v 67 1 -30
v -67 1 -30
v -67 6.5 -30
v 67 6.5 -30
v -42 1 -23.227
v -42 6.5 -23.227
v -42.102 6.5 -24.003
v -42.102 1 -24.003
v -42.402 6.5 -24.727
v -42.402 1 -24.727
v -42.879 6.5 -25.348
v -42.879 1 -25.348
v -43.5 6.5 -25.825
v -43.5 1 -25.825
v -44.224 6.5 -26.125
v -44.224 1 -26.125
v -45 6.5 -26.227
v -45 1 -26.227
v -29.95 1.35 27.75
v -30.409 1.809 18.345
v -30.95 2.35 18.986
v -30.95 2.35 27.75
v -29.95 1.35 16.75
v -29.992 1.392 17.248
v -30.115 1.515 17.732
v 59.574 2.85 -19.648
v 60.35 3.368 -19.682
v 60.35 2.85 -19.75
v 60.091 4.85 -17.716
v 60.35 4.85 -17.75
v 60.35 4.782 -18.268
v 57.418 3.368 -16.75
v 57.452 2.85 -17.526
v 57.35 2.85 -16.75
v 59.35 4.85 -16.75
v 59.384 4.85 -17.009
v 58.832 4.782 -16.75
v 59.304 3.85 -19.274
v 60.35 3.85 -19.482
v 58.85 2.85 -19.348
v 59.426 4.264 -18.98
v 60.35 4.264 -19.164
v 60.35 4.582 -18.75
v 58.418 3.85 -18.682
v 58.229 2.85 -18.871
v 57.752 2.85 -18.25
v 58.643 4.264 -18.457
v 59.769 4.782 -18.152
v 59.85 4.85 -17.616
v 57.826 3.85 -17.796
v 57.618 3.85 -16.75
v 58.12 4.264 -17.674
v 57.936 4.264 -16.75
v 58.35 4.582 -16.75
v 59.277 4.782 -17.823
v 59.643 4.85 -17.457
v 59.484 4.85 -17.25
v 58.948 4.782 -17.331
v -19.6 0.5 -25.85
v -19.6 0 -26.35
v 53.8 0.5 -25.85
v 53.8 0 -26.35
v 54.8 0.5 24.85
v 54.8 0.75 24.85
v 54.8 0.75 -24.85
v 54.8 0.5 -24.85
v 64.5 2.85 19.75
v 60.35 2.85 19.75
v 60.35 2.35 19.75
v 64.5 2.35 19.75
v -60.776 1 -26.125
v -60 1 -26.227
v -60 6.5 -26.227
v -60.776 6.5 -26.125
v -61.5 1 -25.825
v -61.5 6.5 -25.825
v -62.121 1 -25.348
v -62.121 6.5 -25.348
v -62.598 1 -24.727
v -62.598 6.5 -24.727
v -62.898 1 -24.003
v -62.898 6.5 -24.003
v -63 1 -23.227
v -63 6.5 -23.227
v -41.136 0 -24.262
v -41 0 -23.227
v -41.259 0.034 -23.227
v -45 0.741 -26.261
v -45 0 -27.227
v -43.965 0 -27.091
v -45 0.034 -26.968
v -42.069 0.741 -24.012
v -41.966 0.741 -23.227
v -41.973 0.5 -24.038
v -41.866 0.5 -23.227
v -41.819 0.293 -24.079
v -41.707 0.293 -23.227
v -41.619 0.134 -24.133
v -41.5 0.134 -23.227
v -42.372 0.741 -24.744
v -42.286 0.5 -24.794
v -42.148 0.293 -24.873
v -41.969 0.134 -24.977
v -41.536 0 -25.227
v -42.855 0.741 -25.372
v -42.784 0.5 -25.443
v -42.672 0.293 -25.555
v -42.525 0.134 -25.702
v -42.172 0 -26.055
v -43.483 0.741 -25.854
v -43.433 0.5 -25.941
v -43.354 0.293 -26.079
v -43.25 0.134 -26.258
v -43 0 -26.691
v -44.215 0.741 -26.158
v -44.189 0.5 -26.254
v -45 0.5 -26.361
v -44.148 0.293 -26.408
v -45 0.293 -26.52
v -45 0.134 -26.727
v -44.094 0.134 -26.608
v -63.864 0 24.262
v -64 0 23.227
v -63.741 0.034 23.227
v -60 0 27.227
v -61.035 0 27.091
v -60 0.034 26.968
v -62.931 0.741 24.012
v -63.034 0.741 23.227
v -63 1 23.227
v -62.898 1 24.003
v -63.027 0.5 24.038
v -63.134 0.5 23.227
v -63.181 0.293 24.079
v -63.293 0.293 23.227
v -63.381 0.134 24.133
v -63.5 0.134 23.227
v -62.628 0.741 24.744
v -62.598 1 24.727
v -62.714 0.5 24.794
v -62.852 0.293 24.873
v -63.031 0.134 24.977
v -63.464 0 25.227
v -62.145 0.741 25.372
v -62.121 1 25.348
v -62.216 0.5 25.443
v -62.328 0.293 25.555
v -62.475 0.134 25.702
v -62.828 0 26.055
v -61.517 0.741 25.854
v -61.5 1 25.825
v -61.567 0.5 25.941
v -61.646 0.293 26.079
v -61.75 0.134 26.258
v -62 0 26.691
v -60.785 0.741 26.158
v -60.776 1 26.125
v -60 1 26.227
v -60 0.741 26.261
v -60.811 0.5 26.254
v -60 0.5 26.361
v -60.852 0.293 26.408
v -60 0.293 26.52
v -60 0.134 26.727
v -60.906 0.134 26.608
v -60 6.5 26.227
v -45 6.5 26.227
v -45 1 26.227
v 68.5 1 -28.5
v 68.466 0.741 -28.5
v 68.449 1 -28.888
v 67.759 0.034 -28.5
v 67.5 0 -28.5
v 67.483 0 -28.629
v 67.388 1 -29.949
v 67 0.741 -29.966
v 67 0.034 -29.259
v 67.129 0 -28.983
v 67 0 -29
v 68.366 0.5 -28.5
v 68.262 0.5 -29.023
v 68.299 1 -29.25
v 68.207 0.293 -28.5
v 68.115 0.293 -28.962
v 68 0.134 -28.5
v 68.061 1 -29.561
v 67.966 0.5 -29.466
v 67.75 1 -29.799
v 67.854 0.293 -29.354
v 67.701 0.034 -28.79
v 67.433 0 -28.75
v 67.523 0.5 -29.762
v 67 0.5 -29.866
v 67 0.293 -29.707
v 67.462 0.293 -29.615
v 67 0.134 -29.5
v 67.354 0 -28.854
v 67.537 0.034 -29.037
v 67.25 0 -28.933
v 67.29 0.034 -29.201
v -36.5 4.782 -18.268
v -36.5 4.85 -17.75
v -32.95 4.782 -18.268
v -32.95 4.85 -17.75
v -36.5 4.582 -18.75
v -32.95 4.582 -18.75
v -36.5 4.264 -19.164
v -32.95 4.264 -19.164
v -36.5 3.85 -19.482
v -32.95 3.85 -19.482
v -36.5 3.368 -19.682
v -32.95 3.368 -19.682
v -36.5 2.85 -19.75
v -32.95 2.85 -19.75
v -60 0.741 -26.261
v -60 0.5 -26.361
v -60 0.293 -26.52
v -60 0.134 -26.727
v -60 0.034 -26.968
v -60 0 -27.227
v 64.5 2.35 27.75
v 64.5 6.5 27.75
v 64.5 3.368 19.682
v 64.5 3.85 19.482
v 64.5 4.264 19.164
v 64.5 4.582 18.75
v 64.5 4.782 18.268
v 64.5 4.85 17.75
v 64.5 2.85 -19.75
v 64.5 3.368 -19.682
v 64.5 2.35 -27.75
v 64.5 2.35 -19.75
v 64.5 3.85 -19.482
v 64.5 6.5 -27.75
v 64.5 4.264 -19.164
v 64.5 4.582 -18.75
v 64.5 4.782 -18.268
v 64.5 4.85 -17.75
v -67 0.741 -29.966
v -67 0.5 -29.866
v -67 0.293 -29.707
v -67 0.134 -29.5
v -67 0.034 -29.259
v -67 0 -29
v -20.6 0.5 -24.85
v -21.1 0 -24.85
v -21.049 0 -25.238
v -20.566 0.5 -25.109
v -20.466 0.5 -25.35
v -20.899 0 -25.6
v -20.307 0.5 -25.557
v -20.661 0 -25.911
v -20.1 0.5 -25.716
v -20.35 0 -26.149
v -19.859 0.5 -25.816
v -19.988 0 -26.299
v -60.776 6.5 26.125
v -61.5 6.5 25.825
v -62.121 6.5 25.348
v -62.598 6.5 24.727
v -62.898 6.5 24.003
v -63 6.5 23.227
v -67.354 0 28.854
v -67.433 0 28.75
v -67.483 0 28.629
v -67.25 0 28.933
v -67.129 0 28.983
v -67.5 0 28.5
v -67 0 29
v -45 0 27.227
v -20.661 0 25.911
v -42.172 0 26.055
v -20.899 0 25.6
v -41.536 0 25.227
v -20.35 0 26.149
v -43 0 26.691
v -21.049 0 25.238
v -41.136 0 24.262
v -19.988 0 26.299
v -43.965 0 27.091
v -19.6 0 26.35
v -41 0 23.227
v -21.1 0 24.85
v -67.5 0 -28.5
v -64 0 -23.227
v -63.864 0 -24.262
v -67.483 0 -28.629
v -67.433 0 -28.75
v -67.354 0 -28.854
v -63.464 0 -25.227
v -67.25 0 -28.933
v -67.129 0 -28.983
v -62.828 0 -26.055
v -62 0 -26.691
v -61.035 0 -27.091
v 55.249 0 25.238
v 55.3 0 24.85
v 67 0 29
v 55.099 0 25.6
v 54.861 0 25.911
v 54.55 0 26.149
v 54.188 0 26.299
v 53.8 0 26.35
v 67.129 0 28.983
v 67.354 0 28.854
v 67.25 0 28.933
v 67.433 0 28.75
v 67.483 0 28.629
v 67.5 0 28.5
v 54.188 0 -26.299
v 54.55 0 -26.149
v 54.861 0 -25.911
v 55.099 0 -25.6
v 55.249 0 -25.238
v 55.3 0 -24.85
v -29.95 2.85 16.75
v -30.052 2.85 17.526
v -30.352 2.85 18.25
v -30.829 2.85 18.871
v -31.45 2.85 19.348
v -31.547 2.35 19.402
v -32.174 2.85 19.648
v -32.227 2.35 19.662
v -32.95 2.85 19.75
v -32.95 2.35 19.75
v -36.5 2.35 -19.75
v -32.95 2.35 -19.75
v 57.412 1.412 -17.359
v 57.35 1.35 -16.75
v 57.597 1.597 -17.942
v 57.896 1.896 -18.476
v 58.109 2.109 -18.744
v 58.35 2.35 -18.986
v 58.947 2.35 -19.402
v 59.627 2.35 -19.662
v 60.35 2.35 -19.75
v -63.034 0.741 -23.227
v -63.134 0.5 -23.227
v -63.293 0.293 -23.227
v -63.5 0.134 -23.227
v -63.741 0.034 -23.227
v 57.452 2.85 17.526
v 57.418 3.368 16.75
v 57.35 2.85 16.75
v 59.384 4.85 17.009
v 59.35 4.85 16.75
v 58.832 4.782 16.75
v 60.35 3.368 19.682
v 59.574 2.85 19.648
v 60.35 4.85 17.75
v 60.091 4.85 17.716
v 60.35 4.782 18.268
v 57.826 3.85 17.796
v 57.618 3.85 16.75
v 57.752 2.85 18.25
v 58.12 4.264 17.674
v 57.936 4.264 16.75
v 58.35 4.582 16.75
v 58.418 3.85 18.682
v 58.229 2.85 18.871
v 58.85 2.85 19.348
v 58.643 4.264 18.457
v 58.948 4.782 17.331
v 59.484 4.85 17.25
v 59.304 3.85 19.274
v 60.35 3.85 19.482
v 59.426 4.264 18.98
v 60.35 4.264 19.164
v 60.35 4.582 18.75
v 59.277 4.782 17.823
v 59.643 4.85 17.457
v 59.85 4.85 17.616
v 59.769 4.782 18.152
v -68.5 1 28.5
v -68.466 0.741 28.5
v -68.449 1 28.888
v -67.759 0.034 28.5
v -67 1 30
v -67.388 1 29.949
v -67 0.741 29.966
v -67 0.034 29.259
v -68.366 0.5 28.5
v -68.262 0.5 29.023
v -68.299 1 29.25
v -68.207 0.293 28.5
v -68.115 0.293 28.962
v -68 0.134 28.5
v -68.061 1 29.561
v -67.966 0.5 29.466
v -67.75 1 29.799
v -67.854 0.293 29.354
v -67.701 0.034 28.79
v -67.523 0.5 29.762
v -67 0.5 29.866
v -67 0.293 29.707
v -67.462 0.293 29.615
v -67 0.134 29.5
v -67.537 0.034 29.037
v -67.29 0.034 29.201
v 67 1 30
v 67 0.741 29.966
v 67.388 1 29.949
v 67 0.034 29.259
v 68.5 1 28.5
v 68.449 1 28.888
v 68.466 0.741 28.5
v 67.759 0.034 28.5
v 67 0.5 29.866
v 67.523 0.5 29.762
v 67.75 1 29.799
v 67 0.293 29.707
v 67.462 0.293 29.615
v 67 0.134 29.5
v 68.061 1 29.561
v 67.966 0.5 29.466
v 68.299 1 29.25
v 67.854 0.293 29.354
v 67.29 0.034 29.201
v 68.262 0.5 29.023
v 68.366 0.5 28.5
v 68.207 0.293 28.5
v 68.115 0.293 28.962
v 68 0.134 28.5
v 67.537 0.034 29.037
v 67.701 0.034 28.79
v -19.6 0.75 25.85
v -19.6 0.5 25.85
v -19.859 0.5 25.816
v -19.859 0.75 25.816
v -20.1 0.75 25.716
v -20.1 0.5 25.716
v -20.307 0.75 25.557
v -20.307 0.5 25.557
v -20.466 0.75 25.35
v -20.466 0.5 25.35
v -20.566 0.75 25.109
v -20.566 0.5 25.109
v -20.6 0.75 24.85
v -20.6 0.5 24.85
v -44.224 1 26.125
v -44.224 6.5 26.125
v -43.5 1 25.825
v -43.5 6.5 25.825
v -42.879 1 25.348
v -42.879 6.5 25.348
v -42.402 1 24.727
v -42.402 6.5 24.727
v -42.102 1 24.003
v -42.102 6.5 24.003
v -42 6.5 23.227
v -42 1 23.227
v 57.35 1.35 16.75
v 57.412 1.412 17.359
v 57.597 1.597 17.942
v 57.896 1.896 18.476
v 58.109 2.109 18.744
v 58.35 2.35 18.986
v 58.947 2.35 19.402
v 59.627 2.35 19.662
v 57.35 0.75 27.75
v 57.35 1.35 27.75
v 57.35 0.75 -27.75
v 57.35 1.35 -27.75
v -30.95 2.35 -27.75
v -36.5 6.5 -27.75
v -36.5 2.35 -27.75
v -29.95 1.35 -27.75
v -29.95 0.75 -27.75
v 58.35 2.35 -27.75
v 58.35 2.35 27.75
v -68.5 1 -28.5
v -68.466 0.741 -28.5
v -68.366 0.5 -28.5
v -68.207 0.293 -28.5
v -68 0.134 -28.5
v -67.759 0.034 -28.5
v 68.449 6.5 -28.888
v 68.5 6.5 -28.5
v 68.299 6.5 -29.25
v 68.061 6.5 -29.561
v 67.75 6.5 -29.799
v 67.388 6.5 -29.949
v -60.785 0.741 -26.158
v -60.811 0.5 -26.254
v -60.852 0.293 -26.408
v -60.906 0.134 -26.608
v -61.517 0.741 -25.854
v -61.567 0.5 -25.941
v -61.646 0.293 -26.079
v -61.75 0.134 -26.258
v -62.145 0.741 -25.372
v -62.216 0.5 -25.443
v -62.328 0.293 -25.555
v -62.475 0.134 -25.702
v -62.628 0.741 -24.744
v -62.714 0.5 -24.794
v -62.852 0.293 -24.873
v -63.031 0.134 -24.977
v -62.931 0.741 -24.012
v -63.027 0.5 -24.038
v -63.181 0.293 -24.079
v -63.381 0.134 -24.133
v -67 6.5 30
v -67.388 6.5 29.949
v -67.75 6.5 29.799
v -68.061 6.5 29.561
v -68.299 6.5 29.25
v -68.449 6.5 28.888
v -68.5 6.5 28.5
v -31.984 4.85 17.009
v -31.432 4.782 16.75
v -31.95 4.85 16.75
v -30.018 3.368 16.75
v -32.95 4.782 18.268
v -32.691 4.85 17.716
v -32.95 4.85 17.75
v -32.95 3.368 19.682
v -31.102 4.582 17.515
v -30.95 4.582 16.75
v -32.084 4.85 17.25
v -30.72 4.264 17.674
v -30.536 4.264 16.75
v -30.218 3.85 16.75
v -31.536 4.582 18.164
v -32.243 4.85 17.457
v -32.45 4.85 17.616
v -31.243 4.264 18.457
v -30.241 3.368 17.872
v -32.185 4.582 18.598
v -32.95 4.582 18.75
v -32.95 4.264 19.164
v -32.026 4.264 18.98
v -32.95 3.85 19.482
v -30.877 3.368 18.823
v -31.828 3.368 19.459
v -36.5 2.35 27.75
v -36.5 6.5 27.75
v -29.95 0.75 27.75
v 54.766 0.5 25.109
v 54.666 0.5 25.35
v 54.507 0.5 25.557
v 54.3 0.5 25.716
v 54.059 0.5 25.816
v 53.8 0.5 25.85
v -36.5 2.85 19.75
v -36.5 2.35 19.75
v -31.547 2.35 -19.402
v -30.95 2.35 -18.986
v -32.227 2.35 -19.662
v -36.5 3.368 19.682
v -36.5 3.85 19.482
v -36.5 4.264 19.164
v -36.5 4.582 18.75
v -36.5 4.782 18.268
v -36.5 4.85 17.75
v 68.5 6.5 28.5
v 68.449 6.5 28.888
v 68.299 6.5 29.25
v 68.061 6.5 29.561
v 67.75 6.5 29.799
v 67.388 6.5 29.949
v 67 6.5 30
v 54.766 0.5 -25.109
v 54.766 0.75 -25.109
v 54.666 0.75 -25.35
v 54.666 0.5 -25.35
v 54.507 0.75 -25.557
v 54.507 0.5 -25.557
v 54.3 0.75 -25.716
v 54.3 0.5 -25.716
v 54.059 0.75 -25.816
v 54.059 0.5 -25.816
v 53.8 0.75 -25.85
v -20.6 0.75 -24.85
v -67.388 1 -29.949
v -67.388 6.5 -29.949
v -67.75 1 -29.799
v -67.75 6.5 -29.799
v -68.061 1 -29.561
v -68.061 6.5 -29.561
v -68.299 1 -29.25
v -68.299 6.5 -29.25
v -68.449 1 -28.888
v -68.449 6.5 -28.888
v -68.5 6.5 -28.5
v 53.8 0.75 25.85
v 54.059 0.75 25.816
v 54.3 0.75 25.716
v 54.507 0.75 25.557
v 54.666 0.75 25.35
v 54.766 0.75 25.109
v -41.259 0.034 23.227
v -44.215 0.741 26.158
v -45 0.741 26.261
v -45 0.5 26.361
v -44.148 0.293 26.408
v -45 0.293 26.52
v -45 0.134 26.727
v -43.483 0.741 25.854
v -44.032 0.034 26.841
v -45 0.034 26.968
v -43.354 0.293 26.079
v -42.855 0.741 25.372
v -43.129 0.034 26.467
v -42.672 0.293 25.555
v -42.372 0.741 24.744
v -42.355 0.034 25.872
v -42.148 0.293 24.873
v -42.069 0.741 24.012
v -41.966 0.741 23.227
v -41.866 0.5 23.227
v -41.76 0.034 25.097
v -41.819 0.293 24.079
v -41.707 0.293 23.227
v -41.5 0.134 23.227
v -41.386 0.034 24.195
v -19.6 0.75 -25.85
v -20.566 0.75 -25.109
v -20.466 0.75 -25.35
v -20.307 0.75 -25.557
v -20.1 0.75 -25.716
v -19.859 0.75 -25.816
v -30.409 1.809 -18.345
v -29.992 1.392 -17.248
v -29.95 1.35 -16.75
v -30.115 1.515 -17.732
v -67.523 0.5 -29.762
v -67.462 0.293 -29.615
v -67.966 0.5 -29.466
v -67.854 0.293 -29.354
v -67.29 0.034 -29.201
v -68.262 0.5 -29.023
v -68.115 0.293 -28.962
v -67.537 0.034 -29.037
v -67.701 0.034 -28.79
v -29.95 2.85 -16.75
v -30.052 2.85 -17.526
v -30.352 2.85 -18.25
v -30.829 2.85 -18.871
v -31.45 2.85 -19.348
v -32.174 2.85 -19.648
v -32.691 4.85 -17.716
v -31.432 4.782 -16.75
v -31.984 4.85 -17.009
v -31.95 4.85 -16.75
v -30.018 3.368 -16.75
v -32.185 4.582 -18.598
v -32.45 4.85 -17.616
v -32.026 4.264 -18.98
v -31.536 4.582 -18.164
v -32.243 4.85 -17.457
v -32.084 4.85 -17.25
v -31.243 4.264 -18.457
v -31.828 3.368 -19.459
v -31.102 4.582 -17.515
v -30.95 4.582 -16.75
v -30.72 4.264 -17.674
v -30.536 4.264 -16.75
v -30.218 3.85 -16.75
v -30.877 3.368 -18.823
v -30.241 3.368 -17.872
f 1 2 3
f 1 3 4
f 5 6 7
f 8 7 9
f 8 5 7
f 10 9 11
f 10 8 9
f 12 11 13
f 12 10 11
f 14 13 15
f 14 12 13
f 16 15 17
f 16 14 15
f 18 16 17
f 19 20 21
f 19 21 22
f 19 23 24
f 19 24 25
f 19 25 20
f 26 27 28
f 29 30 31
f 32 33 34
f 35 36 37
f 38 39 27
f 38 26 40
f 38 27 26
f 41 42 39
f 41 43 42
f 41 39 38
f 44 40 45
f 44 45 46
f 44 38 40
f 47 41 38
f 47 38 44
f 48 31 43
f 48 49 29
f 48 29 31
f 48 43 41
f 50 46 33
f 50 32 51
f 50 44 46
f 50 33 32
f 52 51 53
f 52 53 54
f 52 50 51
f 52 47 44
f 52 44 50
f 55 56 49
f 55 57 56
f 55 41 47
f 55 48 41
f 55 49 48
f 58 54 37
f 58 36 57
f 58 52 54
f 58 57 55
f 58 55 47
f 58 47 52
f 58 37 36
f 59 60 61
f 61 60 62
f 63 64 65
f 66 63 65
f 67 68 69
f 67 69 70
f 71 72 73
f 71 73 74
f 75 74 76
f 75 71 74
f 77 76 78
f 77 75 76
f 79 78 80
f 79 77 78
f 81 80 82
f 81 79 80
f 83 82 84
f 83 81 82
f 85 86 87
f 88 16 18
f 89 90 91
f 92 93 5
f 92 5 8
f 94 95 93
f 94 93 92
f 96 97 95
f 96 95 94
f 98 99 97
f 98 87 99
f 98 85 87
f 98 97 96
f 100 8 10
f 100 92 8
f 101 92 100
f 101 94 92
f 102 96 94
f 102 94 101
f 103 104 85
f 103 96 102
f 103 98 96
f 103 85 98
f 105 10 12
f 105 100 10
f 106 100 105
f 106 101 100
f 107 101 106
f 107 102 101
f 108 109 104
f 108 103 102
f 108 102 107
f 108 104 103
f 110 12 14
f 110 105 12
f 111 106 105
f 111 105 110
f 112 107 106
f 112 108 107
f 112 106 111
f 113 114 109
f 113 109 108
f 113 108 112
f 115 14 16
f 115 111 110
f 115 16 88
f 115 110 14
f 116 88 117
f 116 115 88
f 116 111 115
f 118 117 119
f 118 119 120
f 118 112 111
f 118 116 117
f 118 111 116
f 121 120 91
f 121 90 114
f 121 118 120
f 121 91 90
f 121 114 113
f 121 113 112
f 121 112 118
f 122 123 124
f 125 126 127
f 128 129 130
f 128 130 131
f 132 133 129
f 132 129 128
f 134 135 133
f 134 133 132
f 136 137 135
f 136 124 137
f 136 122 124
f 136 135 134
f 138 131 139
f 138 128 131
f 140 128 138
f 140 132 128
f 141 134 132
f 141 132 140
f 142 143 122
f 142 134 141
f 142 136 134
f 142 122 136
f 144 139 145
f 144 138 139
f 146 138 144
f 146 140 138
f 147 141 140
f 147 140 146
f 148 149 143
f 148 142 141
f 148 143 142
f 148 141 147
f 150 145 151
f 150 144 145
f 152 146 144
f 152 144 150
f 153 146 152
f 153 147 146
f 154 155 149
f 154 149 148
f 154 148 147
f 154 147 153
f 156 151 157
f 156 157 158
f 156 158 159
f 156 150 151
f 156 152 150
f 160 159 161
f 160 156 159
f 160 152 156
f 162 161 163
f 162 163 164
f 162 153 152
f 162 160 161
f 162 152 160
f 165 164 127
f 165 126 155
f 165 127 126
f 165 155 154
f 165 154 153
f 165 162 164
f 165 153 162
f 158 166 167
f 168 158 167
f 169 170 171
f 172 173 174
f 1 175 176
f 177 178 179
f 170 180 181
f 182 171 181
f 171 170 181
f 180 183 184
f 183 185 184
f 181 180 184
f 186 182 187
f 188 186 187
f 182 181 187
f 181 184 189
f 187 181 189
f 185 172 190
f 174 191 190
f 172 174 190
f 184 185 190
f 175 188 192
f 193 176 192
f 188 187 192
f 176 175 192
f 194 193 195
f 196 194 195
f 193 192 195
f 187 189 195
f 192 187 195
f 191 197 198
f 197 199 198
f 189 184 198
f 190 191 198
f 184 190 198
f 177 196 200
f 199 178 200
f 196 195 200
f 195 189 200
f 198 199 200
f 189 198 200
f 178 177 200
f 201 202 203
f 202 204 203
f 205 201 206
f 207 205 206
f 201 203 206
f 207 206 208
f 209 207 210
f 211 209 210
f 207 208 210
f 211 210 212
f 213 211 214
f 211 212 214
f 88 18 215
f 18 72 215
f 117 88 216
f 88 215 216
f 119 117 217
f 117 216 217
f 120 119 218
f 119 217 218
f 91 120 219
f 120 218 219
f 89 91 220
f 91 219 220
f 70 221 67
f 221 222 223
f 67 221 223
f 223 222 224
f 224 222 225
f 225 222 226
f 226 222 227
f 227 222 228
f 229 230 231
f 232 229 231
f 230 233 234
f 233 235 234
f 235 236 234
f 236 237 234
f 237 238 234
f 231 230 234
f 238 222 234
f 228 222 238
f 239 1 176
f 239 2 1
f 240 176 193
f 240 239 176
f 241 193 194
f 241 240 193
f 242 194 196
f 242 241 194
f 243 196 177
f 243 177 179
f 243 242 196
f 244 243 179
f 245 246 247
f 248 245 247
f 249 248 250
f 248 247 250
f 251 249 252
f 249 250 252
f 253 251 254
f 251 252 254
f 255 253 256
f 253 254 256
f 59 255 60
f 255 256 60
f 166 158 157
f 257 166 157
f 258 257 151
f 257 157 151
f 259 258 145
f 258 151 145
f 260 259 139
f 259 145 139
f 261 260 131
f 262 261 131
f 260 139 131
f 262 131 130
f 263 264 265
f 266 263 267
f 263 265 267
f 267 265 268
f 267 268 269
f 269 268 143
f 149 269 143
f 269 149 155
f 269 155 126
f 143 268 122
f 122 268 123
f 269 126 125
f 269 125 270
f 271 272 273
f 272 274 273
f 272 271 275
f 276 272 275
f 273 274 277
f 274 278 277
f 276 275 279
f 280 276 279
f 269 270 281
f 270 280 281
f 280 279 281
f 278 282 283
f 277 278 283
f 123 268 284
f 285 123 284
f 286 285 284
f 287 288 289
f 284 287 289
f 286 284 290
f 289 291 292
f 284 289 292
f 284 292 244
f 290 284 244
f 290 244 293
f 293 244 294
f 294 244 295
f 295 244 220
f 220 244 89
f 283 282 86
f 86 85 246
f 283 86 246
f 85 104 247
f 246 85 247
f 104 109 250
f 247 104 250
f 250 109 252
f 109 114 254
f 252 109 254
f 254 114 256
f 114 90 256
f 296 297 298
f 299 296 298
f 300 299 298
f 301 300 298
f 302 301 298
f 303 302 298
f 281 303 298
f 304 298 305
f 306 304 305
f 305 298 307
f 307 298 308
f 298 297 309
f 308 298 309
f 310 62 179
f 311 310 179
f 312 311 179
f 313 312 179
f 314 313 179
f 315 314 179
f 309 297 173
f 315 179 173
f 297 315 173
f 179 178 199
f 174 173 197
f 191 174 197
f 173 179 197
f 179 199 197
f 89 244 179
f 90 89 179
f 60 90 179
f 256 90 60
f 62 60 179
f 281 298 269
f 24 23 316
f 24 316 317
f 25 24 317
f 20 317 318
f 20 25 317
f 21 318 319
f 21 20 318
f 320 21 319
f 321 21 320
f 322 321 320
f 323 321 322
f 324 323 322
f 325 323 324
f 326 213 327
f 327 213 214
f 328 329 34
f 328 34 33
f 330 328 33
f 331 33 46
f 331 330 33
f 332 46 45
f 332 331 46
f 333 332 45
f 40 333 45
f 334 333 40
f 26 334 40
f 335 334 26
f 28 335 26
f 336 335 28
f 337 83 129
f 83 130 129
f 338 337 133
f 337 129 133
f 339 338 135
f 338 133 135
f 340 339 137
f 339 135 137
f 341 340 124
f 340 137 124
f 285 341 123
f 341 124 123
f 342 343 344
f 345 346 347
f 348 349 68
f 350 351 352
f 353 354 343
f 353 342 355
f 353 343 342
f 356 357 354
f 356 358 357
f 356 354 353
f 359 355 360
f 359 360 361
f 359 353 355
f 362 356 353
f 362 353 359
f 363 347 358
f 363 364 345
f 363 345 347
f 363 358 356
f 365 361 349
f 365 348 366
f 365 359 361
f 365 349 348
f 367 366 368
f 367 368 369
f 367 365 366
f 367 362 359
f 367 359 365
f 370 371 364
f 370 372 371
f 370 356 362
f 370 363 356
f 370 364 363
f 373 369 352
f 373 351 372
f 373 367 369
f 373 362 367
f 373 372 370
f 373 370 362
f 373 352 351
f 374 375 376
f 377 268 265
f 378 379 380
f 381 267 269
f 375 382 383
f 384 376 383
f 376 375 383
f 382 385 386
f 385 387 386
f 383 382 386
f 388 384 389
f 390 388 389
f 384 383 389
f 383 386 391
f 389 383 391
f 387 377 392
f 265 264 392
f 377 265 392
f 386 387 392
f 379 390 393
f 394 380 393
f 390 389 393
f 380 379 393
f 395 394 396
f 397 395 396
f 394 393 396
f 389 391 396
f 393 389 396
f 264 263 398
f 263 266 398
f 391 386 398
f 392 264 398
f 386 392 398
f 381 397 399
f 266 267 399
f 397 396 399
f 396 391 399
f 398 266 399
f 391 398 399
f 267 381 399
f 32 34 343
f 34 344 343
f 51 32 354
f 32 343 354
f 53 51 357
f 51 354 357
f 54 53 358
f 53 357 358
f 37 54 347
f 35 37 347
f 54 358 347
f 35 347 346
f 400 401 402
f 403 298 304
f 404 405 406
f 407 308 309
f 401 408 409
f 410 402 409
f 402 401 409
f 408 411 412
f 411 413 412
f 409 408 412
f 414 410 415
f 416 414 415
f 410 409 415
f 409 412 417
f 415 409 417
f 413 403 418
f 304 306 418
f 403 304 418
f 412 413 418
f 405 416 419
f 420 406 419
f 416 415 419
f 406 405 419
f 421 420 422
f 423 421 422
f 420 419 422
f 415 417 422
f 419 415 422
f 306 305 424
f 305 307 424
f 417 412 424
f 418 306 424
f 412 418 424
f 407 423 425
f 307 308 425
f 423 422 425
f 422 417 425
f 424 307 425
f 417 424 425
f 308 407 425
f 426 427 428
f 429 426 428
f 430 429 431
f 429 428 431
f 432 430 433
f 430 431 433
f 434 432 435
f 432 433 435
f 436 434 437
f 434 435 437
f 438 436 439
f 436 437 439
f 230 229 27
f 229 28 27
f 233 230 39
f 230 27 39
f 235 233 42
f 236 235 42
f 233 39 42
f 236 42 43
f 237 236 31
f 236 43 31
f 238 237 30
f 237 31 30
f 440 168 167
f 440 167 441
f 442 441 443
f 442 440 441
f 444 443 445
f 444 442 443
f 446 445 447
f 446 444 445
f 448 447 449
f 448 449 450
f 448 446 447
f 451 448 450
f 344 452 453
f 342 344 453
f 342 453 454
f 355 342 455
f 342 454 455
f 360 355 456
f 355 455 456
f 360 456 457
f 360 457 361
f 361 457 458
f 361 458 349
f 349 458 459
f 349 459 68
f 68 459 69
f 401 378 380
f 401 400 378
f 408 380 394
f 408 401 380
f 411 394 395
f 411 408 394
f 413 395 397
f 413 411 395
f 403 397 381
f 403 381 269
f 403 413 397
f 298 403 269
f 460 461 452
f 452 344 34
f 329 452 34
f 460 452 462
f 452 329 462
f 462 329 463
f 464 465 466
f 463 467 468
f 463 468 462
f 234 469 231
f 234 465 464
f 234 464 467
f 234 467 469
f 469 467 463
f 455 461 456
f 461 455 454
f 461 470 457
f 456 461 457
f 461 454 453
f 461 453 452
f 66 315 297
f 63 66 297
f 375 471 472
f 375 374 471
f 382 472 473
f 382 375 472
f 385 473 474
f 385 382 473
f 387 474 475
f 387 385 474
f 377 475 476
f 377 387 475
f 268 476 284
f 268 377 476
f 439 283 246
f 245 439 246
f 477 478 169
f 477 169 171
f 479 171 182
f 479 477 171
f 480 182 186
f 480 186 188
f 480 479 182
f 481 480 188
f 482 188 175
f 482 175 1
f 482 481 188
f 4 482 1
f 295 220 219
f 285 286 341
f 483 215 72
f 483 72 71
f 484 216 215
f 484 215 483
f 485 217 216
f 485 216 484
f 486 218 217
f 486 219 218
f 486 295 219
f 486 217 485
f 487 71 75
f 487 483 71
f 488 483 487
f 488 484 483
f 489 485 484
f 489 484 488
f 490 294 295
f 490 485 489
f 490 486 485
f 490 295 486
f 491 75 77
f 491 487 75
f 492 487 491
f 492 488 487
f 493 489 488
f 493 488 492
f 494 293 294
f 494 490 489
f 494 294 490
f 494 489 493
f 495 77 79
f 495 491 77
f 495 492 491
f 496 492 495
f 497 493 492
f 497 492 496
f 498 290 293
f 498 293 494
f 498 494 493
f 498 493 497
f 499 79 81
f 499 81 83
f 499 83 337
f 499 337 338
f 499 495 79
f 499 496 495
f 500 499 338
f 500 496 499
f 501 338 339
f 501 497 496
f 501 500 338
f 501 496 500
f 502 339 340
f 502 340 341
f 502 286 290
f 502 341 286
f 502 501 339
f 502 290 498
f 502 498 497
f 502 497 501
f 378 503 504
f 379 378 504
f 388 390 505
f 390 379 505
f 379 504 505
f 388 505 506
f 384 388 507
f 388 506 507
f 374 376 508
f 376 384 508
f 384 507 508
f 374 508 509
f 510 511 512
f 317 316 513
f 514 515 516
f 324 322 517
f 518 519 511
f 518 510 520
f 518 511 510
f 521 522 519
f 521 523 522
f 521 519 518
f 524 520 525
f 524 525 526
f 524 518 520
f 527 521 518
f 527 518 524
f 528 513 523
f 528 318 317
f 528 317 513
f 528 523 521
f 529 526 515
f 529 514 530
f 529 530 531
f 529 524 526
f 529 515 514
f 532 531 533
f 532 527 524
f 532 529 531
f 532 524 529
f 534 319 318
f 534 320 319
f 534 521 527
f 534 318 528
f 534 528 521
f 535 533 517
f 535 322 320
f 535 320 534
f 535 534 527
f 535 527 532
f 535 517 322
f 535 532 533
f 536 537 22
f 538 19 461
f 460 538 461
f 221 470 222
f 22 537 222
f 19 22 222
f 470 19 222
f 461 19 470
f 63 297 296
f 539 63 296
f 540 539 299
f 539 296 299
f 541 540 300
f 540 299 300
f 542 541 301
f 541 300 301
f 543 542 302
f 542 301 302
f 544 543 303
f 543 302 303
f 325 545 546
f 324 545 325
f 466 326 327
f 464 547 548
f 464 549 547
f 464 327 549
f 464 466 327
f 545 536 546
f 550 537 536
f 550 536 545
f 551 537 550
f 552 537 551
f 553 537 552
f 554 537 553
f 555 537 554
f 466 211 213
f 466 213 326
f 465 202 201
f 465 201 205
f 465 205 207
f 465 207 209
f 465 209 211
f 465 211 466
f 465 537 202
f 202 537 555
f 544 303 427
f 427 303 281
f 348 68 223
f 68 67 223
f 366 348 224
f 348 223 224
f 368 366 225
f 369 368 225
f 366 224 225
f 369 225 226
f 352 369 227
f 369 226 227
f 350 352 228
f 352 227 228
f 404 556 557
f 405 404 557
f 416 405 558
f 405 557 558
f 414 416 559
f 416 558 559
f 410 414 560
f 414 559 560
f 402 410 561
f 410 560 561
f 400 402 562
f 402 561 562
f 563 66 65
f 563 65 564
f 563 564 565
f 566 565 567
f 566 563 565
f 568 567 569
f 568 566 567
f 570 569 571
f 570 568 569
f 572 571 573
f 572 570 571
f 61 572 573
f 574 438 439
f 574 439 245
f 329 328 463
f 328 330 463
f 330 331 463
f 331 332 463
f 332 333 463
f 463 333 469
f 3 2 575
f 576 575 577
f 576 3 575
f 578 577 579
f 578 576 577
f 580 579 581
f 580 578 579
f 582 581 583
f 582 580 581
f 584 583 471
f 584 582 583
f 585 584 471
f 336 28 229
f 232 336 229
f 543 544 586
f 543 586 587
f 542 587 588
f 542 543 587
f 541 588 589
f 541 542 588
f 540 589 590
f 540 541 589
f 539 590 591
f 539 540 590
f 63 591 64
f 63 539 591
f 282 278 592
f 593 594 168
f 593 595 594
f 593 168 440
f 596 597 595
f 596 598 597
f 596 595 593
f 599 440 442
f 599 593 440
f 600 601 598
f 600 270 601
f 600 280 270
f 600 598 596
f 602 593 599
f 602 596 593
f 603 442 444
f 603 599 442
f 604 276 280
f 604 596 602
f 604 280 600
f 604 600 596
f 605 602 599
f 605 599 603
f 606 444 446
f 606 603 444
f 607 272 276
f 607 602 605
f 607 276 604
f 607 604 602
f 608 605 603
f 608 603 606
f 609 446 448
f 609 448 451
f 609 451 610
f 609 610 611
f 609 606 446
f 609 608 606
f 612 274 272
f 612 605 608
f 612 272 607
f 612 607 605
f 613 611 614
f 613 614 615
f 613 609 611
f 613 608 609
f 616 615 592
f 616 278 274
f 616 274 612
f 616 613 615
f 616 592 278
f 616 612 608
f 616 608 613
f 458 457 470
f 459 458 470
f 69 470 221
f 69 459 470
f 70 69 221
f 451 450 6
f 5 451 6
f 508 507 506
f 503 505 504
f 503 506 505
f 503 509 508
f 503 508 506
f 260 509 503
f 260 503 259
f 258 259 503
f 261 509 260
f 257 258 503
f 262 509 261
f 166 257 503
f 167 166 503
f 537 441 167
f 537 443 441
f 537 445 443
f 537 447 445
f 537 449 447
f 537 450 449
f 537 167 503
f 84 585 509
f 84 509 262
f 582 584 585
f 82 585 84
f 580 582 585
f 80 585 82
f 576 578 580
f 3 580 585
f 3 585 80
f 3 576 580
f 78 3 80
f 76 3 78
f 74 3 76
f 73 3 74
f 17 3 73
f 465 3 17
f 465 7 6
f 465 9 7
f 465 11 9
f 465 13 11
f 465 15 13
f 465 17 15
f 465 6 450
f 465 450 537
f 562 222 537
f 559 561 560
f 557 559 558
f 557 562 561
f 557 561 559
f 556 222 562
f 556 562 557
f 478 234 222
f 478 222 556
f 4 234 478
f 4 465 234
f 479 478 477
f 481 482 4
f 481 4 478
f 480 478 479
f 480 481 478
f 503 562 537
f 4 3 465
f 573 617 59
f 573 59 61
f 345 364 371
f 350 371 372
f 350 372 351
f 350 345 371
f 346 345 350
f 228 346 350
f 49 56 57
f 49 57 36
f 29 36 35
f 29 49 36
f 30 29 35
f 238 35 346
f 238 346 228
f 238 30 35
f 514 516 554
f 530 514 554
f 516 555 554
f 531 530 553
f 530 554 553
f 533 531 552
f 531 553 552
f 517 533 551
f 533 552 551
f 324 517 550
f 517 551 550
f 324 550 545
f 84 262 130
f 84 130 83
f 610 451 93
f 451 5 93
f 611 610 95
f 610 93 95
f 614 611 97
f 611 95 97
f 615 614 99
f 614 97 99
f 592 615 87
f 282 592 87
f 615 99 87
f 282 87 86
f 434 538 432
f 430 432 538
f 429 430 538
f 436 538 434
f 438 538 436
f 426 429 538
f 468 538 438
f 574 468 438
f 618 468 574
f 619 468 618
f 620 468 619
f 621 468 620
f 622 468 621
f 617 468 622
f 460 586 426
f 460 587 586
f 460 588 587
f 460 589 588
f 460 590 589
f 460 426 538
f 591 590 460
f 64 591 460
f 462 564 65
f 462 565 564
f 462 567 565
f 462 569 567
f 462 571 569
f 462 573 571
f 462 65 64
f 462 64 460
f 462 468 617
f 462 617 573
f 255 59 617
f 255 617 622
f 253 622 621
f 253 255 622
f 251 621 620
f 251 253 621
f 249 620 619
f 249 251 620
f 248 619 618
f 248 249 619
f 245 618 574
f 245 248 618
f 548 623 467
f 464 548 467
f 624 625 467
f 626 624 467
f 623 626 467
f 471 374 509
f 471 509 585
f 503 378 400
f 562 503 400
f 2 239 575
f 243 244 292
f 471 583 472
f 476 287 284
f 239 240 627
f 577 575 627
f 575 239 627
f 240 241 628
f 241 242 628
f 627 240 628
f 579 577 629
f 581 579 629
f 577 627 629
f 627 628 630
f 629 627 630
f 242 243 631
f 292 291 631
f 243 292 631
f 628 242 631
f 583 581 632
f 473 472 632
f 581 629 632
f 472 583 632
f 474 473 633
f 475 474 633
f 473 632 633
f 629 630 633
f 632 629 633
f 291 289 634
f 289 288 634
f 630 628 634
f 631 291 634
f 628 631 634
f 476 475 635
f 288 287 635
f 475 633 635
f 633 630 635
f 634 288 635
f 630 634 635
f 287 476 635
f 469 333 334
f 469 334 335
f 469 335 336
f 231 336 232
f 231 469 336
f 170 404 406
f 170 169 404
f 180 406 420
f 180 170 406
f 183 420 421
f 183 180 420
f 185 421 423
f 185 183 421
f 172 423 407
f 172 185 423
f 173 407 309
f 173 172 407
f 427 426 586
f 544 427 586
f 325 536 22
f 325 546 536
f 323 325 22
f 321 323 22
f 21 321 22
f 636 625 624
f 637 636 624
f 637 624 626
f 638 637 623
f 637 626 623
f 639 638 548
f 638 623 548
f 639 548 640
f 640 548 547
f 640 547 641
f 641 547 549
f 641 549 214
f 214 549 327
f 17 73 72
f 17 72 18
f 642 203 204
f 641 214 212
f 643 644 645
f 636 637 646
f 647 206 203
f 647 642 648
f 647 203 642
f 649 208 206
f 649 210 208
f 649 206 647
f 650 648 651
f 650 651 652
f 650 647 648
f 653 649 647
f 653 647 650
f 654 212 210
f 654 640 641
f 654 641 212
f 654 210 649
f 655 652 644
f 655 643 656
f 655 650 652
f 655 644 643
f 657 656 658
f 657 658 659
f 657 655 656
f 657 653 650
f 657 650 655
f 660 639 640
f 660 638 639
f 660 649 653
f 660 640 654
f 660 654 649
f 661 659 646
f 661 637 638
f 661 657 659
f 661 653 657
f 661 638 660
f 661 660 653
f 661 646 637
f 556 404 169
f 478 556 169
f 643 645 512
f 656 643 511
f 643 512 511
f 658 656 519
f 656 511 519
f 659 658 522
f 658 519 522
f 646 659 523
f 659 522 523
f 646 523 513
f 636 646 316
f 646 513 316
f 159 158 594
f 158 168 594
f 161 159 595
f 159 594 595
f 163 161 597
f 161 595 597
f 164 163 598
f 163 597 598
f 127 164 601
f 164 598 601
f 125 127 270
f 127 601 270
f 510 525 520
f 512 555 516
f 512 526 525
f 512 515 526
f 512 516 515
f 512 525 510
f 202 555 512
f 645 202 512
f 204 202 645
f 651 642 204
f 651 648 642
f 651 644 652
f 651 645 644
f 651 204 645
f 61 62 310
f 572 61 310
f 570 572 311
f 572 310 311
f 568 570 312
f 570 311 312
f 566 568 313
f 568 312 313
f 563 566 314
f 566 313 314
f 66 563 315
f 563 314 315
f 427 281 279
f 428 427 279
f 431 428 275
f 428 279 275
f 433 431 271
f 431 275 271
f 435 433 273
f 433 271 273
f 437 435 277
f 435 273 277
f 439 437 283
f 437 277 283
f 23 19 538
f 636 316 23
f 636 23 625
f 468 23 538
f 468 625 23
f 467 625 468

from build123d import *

# Parameters (mm, degrees)
SKETCH1_W           = 137
SKETCH1_H           = 60
BOSS_EXTRUDE1_DEPTH = 6.5
SKETCH2_W           = 101
SKETCH2_H           = 55.5
CUT_EXTRUDE1_DEPTH  = 1.65
SKETCH3_W           = 87.3
SKETCH3_H           = 55.5
CUT_EXTRUDE2_DEPTH  = 4.1
SKETCH4_W           = 75.4
SKETCH4_H           = 51.7
CUT_EXTRUDE3_DEPTH  = 1.75
FILLET1_R           = 1
SKETCH6_W           = 7.15
SKETCH6_H           = 8
SKETCH6_W_2         = 6.55
CUT_EXTRUDE4_DEPTH  = 2.5
FILLET2_R           = 3
CHAMFER1_SIZE       = 0.5
SKETCH7_W           = 21
SKETCH7_H           = 52.453625608
CUT_EXTRUDE5_DEPTH  = 7.5
FILLET3_R           = 3
FILLET5_R           = 2
CHAMFER3_SIZE       = 1
FILLET6_R           = 1.5
FILLET7_R           = 1


with BuildPart() as part:
    # Sketch1 → Boss-Extrude1 (new body)
    with BuildSketch(Plane(origin=(0, 0, 0), x_dir=(1, 0, 0), z_dir=(0, 1, 0))):
        Rectangle(SKETCH1_W, SKETCH1_H)
    extrude(amount=BOSS_EXTRUDE1_DEPTH)

    # Sketch2 → Cut-Extrude1 (cut)
    with BuildSketch(Plane(origin=(0, 6.5, 0), x_dir=(1, 0, 0), z_dir=(0, 1, 0))):
        with Locations((14, 0)):
            Rectangle(SKETCH2_W, SKETCH2_H)
    extrude(amount=-CUT_EXTRUDE1_DEPTH, mode=Mode.SUBTRACT)

    # Sketch3 → Cut-Extrude2 (cut)
    with BuildSketch(Plane(origin=(0, 4.85, 0), x_dir=(1, 0, 0), z_dir=(0, 1, 0))):
        with Locations((13.7, 0)):
            Rectangle(SKETCH3_W, SKETCH3_H)
    extrude(amount=-CUT_EXTRUDE2_DEPTH, mode=Mode.SUBTRACT)

    # Sketch4 → Cut-Extrude3 (cut, through all)
    with BuildSketch(Plane(origin=(0, 0.75, 0), x_dir=(1, 0, 0), z_dir=(0, 1, 0))):
        with Locations((17.1, 0)):
            Rectangle(SKETCH4_W, SKETCH4_H)
    extrude(amount=-CUT_EXTRUDE3_DEPTH, mode=Mode.SUBTRACT)

    # Fillet1
    fillet1_edges = [part.edges().sort_by_distance(p)[0] for p in [
        (54.8, 0.375, -25.85),
        (54.8, 0.375, 25.85),
        (-20.6, 0.375, 25.85),
        (-20.6, 0.375, -25.85),
    ]]
    fillet(fillet1_edges, radius=FILLET1_R)

    # Sketch6 → Cut-Extrude4 (cut)
    with BuildSketch(Plane(origin=(0, 4.85, 0), x_dir=(1, 0, 0), z_dir=(0, 1, 0))):
        with Locations((60.925, -23.75)):
            Rectangle(SKETCH6_W, SKETCH6_H)
        with Locations((60.925, 23.75)):
            Rectangle(SKETCH6_W, SKETCH6_H)
        with Locations((-33.225, 23.75)):
            Rectangle(SKETCH6_W_2, SKETCH6_H)
        with Locations((-33.225, -23.75)):
            Rectangle(SKETCH6_W_2, SKETCH6_H)
    extrude(amount=-CUT_EXTRUDE4_DEPTH, mode=Mode.SUBTRACT)

    # Fillet2
    fillet2_edges = [part.edges().sort_by_distance(p)[0] for p in [
        (-29.95, 3.6, 19.75),
        (-29.95, 3.6, -19.75),
        (57.35, 3.6, -19.75),
        (57.35, 3.6, 19.75),
    ]]
    fillet(fillet2_edges, radius=FILLET2_R)

    # Chamfer1
    chamfer1_edges = [part.edges().sort_by_distance(p)[0] for p in [
        (17.1, 0, -25.85),
        (54.8, 0, 0),
        (17.1, 0, 25.85),
        (-20.6, 0, 0),
        (54.507106781, 0, -25.557106781),
        (54.507106781, 0, 25.557106781),
        (-20.307106781, 0, 25.557106781),
        (-20.307106781, 0, -25.557106781),
    ]]
    chamfer(chamfer1_edges, length=CHAMFER1_SIZE)

    # Sketch7 → Cut-Extrude5 (cut, through all)
    with BuildSketch(Plane(origin=(0, 6.5, 0), x_dir=(1, 0, 0), z_dir=(0, 1, 0))):
        with Locations((-52.5, 0)):
            Rectangle(SKETCH7_W, SKETCH7_H)
    extrude(amount=-CUT_EXTRUDE5_DEPTH, mode=Mode.SUBTRACT)

    # Fillet3
    fillet3_edges = [part.edges().sort_by_distance(p)[0] for p in [
        (-42, 3.25, -26.226812804),
        (-42, 3.25, 26.226812804),
        (-63, 3.25, 26.226812804),
        (-63, 3.25, -26.226812804),
    ]]
    fillet(fillet3_edges, radius=FILLET3_R)

    # Fillet5
    fillet5_edges = [part.edges().sort_by_distance(p)[0] for p in [
        (-34.725, 4.85, -19.75),
        (62.425, 4.85, 19.75),
        (62.425, 4.85, -19.75),
        (57.35, 4.85, 0),
        (58.228679656, 4.85, 18.871320344),
        (58.228679656, 4.85, -18.871320344),
        (-34.725, 4.85, 19.75),
        (-29.95, 4.85, 0),
        (-30.828679656, 4.85, -18.871320344),
        (-30.828679656, 4.85, 18.871320344),
    ]]
    fillet(fillet5_edges, radius=FILLET5_R)

    # Chamfer3
    chamfer3_edges = [part.edges().sort_by_distance(p)[0] for p in [
        (-29.95, 2.35, 22.25),
        (-29.95, 2.35, -22.25),
        (57.35, 2.35, -22.25),
        (57.35, 2.35, 22.25),
    ]]
    chamfer(chamfer3_edges, length=CHAMFER3_SIZE)

    # Fillet6
    fillet6_edges = [part.edges().sort_by_distance(p)[0] for p in [
        (68.5, 3.25, 30),
        (-68.5, 3.25, 30),
        (-68.5, 3.25, -30),
        (68.5, 3.25, -30),
    ]]
    fillet(fillet6_edges, radius=FILLET6_R)

    # Fillet7
    fillet7_edges = [part.edges().sort_by_distance(p)[0] for p in [
        (-42, 0, 0),
        (-52.5, 0, 26.226812804),
        (-63, 0, 0),
        (-52.5, 0, -26.226812804),
        (-42.878679656, 0, 25.348133148),
        (-62.121320344, 0, 25.348133148),
        (-62.121320344, 0, -25.348133148),
        (-42.878679656, 0, -25.348133148),
        (68.5, 0, 0),
        (0, 0, 30),
        (-68.5, 0, 0),
        (0, 0, -30),
        (68.060660172, 0, -29.560660172),
        (-68.060660172, 0, -29.560660172),
        (-68.060660172, 0, 29.560660172),
        (68.060660172, 0, 29.560660172),
    ]]
    fillet(fillet7_edges, radius=FILLET7_R)


solid = part.part
